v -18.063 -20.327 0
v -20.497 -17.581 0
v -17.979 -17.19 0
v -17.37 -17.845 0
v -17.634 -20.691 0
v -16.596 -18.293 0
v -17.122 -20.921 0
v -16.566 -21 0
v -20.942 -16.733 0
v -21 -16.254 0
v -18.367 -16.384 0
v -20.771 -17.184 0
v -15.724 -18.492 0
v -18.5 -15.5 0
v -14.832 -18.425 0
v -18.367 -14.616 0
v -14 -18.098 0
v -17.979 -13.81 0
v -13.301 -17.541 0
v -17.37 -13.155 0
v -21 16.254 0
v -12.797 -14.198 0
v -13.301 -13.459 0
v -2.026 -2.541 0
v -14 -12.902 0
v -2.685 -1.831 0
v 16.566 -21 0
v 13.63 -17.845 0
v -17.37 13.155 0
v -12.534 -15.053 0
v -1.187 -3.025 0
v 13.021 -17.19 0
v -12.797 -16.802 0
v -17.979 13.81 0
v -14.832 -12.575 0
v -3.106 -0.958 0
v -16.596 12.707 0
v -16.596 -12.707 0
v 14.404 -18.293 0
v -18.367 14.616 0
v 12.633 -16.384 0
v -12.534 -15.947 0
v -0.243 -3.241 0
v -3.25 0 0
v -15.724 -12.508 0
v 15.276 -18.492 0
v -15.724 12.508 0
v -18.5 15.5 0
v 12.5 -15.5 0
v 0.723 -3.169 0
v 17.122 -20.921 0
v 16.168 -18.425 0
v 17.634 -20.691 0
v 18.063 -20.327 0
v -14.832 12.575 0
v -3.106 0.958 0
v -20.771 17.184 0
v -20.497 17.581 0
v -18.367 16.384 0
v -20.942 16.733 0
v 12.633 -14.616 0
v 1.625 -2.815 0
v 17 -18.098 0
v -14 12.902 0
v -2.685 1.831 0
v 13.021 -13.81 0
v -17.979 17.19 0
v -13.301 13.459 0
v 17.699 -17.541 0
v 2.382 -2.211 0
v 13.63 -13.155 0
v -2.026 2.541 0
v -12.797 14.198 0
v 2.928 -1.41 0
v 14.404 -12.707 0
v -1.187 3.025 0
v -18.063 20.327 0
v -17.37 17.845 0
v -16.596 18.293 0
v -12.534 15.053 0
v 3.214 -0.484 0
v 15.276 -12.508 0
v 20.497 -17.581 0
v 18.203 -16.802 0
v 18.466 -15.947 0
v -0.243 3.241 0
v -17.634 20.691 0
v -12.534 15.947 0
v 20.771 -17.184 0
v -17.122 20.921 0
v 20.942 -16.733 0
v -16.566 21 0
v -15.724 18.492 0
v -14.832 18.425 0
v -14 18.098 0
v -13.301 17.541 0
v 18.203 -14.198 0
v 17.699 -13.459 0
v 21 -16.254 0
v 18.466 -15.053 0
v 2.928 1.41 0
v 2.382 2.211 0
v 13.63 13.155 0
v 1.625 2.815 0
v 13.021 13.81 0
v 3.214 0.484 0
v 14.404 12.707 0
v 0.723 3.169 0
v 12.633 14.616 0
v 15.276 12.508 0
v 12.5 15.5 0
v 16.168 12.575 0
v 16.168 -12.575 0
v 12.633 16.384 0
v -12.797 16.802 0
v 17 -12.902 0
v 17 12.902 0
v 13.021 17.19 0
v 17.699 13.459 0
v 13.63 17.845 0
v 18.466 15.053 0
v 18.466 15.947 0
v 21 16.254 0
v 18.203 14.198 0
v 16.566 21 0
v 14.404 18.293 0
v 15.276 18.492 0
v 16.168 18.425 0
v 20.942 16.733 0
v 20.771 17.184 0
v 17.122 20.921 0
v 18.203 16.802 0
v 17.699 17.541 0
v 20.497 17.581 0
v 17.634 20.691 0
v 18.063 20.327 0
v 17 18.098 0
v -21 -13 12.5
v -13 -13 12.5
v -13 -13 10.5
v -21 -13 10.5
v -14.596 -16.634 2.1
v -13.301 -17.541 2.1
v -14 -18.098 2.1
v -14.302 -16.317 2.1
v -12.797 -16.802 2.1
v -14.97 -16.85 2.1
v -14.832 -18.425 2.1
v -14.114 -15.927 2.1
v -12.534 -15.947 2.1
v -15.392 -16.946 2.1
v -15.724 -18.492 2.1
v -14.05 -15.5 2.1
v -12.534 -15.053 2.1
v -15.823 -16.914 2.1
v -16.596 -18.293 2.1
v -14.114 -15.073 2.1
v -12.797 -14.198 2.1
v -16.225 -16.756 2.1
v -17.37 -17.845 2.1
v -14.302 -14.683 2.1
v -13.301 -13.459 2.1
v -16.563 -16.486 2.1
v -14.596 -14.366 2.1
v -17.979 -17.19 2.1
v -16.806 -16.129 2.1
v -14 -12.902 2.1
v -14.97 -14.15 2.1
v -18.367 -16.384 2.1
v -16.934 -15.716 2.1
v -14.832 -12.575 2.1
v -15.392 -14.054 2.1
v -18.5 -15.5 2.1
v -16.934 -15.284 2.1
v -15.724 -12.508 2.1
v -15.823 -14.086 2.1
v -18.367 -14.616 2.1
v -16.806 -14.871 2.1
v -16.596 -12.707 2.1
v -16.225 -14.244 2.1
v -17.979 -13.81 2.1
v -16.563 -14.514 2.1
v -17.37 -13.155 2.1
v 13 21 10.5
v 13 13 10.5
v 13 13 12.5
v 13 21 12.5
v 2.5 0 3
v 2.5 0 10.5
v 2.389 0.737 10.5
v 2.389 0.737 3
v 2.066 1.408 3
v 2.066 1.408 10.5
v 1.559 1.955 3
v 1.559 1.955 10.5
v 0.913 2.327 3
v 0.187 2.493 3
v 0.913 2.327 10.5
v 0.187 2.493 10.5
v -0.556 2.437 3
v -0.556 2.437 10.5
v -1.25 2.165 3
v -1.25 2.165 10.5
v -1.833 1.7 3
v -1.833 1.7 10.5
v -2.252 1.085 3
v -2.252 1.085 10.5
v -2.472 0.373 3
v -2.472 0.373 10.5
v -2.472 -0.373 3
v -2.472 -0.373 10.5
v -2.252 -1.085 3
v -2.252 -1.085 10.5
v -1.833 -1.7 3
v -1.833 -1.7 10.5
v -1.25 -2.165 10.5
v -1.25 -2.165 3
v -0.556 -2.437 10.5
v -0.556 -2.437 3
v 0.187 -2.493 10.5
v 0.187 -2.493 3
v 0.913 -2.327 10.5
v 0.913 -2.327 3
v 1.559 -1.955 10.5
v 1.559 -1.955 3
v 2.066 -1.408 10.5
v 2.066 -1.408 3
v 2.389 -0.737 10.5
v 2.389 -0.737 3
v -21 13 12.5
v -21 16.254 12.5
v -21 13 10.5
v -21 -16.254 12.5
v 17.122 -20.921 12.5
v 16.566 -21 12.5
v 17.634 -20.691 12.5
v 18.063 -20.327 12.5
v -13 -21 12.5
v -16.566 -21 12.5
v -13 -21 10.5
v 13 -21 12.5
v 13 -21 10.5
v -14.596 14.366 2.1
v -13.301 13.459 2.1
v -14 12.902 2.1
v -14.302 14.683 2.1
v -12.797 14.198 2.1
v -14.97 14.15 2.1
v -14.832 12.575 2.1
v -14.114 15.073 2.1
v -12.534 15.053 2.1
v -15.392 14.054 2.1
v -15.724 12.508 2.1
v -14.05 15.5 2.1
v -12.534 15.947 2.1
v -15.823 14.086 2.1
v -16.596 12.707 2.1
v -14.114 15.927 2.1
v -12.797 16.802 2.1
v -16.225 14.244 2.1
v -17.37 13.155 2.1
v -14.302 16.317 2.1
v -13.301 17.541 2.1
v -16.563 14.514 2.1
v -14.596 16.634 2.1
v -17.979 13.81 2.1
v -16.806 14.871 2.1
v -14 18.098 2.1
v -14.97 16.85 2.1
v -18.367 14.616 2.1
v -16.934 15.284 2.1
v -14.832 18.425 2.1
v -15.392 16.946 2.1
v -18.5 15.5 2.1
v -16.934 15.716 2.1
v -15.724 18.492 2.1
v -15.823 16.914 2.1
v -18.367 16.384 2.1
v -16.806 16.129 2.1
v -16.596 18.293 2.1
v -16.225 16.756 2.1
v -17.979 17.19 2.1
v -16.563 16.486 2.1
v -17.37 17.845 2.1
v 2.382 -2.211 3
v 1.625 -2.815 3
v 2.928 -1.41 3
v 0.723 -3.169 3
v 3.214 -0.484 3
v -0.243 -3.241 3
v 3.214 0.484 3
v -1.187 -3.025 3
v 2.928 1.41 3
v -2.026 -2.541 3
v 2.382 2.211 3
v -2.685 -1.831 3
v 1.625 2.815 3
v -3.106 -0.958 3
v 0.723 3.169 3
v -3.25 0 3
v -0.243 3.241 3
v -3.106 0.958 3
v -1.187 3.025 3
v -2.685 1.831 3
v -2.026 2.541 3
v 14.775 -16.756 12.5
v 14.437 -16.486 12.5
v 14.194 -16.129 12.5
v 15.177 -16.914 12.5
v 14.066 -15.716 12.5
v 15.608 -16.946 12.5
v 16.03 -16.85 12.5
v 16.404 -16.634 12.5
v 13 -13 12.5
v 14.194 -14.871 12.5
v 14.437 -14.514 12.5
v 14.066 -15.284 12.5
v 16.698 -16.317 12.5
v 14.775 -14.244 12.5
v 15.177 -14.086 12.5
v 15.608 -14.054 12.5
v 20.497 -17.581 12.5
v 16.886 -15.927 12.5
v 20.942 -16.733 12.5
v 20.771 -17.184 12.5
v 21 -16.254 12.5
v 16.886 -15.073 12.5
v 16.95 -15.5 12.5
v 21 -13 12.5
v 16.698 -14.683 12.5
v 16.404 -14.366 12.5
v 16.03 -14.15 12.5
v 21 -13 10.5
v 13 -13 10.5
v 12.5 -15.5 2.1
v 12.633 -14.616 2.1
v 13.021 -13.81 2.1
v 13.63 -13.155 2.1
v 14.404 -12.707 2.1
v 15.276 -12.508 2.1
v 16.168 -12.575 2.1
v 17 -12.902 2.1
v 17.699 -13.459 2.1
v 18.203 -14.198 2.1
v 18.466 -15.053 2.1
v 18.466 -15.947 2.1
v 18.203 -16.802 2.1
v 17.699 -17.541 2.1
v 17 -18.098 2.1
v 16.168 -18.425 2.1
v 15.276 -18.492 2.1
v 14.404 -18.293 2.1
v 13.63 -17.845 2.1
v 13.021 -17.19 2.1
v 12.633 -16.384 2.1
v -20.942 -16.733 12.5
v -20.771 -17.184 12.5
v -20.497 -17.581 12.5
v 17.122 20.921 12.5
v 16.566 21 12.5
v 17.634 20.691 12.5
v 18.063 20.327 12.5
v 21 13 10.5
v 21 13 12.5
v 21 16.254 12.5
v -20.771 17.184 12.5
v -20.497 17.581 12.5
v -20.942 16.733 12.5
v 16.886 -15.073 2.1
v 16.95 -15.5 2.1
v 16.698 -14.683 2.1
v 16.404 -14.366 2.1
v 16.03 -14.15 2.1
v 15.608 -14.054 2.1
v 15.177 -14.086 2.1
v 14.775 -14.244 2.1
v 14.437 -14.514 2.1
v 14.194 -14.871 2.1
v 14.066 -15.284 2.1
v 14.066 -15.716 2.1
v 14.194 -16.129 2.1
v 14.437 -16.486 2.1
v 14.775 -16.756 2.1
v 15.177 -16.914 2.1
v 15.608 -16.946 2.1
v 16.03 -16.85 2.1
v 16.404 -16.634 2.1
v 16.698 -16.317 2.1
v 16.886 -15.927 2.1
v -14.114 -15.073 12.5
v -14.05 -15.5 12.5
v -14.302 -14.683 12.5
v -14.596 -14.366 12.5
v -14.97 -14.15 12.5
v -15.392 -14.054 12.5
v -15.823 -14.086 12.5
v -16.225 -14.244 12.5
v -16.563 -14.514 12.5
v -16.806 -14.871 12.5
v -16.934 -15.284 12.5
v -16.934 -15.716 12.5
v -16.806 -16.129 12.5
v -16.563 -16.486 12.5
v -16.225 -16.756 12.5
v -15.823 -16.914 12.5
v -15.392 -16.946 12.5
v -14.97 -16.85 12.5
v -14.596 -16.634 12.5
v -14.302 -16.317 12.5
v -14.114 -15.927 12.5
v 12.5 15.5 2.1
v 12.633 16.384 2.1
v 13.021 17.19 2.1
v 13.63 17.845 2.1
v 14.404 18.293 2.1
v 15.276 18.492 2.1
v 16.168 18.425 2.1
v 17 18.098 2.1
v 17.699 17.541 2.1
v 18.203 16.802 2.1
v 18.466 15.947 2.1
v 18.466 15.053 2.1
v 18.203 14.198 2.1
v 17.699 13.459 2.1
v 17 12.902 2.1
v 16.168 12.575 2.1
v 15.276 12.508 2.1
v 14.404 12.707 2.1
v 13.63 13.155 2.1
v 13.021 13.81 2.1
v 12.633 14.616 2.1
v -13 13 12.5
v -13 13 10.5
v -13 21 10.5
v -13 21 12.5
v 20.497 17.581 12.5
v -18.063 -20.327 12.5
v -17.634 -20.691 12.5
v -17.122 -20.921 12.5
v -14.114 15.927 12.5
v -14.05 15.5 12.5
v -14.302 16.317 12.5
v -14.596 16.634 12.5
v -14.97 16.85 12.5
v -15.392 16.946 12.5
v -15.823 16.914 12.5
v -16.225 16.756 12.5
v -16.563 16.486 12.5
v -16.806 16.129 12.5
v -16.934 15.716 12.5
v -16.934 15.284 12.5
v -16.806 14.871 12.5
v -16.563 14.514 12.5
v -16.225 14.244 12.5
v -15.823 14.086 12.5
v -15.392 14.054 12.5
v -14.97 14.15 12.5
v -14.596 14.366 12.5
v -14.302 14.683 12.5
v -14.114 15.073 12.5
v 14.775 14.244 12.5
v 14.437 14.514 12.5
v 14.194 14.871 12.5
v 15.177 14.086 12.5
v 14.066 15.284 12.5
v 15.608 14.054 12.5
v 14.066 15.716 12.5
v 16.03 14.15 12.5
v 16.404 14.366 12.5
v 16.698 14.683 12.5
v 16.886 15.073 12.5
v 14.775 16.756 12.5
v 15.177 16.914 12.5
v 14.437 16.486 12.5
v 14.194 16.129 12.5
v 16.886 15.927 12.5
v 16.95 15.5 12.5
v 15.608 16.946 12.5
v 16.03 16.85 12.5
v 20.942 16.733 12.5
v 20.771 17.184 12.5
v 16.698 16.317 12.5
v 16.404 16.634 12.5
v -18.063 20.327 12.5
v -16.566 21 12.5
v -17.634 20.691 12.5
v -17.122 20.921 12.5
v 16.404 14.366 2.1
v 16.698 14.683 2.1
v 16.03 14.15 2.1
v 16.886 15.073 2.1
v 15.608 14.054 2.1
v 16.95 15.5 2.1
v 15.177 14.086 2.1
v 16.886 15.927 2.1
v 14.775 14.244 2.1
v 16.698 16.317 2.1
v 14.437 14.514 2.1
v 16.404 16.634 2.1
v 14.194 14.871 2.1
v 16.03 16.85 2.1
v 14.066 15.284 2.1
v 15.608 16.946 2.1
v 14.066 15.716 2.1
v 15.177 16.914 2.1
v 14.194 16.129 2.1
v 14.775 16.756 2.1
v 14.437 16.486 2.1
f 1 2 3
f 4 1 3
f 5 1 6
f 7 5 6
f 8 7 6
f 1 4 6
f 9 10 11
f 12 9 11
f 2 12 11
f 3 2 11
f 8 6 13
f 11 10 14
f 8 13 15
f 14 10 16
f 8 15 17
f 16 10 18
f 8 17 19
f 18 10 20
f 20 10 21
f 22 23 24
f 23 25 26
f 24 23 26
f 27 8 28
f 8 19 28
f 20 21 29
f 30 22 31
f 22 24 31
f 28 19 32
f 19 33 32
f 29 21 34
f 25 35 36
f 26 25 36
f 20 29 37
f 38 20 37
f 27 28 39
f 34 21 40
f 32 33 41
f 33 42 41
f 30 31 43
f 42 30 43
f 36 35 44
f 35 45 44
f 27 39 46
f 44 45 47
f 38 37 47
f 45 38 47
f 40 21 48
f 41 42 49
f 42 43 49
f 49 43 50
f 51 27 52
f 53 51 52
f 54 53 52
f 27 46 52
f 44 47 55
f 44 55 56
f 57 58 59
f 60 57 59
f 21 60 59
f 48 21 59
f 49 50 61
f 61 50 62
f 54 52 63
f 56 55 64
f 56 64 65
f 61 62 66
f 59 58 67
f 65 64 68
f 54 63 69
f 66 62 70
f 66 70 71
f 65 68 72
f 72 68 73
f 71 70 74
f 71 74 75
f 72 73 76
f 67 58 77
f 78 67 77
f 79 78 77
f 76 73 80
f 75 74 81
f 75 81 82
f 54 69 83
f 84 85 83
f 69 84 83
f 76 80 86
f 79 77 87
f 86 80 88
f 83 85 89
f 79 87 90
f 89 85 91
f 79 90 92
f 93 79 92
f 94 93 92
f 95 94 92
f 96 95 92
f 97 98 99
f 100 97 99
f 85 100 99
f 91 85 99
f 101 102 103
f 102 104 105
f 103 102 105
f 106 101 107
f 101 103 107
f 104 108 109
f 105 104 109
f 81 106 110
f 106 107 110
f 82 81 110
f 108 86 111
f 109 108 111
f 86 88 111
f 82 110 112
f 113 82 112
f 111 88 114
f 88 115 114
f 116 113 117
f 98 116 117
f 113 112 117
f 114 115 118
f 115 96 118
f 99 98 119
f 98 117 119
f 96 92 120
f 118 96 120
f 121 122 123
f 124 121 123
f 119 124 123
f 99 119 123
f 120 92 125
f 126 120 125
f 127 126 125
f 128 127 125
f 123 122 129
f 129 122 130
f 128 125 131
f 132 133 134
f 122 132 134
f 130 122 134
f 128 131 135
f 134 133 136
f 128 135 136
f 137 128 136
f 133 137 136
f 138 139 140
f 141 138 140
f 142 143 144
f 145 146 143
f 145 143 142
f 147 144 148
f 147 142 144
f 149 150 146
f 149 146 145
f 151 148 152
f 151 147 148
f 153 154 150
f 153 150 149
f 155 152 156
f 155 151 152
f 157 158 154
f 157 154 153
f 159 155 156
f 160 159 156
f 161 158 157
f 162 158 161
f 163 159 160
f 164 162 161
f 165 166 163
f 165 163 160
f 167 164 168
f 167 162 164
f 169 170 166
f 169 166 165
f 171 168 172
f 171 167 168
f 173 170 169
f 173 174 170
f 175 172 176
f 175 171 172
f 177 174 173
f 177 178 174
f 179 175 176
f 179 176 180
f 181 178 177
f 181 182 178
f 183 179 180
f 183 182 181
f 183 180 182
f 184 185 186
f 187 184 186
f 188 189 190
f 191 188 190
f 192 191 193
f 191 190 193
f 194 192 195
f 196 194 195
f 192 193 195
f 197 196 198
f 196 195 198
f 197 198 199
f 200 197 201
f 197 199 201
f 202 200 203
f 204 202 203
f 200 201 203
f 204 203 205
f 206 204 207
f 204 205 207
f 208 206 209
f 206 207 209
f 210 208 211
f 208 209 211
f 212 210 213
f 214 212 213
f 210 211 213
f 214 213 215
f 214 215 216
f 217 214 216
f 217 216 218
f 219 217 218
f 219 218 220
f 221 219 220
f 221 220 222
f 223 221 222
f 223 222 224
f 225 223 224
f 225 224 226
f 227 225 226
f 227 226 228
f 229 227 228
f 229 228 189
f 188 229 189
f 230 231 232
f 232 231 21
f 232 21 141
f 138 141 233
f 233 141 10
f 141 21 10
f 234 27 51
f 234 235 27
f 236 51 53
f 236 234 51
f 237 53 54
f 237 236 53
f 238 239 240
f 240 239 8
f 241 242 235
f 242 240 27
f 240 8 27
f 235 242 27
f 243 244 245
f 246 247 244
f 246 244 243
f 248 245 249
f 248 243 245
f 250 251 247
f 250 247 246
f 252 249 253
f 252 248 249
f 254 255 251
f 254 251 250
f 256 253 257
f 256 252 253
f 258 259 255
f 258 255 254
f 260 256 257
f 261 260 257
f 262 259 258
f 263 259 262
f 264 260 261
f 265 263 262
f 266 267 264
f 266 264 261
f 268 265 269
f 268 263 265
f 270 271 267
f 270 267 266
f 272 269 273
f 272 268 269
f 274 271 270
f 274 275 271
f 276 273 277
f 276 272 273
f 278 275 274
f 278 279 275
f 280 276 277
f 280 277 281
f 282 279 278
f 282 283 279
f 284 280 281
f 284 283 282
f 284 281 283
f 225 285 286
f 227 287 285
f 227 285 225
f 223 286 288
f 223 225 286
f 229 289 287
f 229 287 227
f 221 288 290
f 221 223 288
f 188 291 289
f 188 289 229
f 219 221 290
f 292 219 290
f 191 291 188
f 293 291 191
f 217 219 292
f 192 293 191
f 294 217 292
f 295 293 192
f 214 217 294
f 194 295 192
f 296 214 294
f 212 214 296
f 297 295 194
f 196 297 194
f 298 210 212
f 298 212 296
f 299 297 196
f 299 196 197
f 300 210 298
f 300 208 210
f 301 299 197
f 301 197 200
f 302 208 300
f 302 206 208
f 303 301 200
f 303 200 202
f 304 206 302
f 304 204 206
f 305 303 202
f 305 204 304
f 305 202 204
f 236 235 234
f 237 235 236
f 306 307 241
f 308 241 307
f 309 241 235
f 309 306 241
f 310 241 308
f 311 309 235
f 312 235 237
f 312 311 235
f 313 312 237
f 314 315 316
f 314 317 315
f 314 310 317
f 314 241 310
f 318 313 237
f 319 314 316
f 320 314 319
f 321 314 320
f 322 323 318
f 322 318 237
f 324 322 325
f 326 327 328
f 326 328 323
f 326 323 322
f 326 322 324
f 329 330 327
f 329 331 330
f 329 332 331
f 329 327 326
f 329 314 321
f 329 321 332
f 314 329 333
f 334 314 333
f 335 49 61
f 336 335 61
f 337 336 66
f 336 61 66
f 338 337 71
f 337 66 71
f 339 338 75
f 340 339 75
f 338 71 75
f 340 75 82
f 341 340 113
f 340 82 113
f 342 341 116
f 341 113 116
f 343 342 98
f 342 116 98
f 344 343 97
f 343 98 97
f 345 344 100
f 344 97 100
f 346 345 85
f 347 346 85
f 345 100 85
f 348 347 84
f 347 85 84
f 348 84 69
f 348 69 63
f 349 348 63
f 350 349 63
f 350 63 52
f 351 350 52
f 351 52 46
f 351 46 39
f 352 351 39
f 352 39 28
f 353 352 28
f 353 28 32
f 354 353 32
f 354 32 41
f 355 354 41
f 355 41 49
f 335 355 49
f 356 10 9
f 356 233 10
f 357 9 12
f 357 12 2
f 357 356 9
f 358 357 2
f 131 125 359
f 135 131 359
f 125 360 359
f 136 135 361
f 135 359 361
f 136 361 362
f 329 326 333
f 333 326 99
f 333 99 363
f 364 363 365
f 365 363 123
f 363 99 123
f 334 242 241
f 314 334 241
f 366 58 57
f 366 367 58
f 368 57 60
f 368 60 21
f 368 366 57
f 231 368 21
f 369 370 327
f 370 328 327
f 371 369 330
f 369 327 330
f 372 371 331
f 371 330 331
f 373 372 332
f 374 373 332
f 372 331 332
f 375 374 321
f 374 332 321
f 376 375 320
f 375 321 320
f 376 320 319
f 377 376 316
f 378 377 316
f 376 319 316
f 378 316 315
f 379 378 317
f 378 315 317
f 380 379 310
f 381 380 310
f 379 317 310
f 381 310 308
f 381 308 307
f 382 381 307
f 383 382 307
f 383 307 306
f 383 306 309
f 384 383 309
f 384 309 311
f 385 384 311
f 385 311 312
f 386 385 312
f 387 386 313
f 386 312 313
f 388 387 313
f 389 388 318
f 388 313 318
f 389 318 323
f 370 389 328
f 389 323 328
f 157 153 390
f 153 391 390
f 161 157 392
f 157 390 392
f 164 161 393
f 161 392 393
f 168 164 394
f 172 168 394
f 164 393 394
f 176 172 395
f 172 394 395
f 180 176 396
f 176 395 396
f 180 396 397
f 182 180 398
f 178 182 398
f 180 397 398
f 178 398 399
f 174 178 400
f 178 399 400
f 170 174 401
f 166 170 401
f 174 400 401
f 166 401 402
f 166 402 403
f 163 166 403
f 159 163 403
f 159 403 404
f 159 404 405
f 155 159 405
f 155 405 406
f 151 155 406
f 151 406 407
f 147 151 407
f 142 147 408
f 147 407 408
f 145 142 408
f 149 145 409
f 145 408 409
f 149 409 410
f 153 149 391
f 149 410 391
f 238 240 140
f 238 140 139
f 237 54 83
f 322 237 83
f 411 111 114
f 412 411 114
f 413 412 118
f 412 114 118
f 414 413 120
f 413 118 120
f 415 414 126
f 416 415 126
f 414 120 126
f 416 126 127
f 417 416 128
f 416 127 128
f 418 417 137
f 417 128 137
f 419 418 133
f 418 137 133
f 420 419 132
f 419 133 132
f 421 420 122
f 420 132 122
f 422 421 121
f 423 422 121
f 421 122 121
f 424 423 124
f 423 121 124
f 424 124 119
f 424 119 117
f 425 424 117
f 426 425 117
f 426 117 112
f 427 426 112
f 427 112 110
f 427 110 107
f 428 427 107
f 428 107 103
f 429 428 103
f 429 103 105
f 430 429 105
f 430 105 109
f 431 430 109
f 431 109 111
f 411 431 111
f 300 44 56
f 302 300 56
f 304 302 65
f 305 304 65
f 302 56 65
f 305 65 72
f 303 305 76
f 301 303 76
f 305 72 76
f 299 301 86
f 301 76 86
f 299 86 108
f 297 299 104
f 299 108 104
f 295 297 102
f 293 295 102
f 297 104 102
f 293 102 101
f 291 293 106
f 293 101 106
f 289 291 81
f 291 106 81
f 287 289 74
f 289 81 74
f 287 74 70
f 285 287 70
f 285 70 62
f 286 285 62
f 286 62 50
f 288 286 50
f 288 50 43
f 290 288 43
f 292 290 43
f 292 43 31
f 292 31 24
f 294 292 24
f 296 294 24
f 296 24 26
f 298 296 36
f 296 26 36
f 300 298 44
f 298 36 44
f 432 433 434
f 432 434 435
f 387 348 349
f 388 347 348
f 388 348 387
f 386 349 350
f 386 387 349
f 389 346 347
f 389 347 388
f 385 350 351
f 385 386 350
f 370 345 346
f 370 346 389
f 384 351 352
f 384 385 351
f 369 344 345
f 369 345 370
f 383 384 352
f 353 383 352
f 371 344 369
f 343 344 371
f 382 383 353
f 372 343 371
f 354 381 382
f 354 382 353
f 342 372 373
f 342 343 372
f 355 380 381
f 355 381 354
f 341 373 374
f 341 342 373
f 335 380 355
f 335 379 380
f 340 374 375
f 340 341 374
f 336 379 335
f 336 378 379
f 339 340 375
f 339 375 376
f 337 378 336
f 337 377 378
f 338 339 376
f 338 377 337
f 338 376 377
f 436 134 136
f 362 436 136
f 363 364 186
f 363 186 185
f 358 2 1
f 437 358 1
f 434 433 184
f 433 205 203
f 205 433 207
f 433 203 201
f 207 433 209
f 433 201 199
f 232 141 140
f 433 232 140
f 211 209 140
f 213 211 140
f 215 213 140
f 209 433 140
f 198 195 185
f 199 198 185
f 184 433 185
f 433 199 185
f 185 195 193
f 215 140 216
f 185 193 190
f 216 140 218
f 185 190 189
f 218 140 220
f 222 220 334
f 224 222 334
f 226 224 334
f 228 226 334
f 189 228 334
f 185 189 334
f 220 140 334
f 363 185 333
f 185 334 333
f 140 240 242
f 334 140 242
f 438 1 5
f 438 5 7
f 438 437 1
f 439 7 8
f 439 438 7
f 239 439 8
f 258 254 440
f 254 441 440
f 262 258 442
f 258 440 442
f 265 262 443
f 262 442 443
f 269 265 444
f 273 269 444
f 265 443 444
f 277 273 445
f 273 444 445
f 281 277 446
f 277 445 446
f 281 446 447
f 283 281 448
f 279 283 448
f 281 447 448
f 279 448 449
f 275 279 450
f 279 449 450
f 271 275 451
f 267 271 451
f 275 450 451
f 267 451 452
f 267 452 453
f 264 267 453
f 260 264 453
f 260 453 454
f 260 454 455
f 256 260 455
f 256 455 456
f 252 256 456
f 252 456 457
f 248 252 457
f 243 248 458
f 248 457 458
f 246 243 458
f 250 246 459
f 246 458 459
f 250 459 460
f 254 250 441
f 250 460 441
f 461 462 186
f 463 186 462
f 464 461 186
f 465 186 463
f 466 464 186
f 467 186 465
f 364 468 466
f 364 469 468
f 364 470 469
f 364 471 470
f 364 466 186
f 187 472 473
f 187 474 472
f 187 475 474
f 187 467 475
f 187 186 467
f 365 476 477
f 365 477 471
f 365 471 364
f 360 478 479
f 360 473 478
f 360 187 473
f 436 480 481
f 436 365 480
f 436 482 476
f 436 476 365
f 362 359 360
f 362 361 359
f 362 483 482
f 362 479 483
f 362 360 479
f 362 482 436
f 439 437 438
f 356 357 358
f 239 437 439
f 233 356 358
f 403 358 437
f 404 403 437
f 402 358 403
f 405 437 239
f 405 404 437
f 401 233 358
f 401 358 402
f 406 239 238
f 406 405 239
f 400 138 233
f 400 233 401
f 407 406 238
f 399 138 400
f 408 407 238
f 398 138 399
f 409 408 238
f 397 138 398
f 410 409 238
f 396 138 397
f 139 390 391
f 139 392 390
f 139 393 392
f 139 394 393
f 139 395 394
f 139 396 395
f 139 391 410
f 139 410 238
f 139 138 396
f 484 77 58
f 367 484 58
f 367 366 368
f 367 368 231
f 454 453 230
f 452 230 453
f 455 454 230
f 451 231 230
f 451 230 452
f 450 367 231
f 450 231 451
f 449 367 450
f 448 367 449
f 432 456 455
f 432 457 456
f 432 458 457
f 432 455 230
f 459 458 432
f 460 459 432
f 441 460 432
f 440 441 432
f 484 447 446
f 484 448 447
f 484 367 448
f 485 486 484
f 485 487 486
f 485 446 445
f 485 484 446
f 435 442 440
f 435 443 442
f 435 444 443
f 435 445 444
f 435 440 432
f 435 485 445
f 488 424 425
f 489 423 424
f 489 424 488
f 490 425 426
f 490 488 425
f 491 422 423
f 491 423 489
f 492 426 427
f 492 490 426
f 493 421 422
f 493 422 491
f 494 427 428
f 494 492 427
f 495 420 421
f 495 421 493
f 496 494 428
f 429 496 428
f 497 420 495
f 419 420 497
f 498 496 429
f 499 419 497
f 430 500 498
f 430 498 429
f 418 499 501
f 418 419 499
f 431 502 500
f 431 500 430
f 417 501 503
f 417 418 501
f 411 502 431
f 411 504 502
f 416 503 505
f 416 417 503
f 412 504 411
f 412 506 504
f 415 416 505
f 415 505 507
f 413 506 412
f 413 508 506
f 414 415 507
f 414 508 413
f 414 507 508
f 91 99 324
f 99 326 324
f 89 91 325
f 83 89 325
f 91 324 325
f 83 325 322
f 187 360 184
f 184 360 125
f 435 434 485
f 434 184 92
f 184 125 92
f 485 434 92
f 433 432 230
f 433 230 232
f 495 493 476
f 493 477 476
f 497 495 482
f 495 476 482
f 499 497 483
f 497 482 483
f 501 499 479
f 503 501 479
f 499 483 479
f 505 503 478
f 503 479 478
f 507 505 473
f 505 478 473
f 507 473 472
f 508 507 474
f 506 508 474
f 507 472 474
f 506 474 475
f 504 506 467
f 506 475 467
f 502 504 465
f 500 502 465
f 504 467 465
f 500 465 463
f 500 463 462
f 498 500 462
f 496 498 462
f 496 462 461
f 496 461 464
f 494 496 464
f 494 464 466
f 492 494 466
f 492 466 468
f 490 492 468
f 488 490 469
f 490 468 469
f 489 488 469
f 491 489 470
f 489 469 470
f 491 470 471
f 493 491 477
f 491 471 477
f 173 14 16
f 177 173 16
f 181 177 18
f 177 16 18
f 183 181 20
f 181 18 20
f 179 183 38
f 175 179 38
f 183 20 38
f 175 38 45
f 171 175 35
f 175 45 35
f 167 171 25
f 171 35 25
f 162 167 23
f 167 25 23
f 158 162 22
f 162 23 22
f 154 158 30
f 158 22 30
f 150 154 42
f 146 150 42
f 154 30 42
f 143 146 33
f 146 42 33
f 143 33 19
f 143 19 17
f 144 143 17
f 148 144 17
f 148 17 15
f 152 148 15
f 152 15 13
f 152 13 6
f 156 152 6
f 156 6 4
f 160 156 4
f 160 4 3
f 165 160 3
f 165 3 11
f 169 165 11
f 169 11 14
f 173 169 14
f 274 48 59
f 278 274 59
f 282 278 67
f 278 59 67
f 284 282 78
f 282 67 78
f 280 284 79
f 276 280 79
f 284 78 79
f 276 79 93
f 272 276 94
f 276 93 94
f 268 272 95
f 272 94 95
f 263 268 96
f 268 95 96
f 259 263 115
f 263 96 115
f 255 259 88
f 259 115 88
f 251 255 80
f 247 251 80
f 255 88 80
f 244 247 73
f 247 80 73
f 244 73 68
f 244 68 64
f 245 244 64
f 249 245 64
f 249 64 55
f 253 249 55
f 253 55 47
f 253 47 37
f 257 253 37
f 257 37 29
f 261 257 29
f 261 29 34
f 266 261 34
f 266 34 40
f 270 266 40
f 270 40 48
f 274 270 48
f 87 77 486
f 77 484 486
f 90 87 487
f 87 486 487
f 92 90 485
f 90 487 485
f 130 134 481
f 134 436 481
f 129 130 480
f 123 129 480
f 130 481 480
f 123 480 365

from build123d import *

# Parameters (mm, degrees)
BOSS_EXTRUDE1_DEPTH                                = 12.5
SKETCH2_W                                          = 2
SKETCH2_H                                          = 26
CUT_EXTRUDE1_DEPTH                                 = 43
SKETCH3_W                                          = 26
SKETCH3_H                                          = 2
CUT_EXTRUDE2_DEPTH                                 = 43
SKETCH4_R                                          = 3.25
CUT_EXTRUDE3_DEPTH                                 = 3
SKETCH5_R                                          = 2.5
CUT_EXTRUDE4_DEPTH                                 = 11.5
CBORE_FOR_M2_5_PAN_HEAD_MACHINE_SCREW1_D           = 2.9
CBORE_FOR_M2_5_PAN_HEAD_MACHINE_SCREW1_CBORE_D     = 6
CBORE_FOR_M2_5_PAN_HEAD_MACHINE_SCREW1_CBORE_DEPTH = 2.1
FILLET1_R                                          = 2


with BuildPart() as part:
    # Sketch1 → Boss-Extrude1 (new body)
    with BuildSketch(Plane.XY):
        Polygon((-17.465670258, 21), (-21, 17.012864847), (-21, -17.012864847), (-17.465670258, -21), (17.465670258, -21), (21, -17.012864847), (21, 17.012864847), (17.465670258, 21), align=None)
    extrude(amount=BOSS_EXTRUDE1_DEPTH)

    # Sketch2 → Cut-Extrude1 (cut, through all)
    with BuildSketch(Plane(origin=(21, 0, 0), x_dir=(0, 0, -1), z_dir=(1, 0, 0))):
        with Locations((-11.5, 0)):
            Rectangle(SKETCH2_W, SKETCH2_H)
    extrude(amount=-CUT_EXTRUDE1_DEPTH, mode=Mode.SUBTRACT)

    # Sketch3 → Cut-Extrude2 (cut, through all)
    with BuildSketch(Plane.XZ.offset(21)):
        with Locations((0, 11.5)):
            Rectangle(SKETCH3_W, SKETCH3_H)
    extrude(amount=-CUT_EXTRUDE2_DEPTH, mode=Mode.SUBTRACT)

    # Sketch4 → Cut-Extrude3 (cut)
    with BuildSketch(Plane(origin=(0, 0, 0), x_dir=(-1, 0, 0), z_dir=(0, 0, -1))):
        Circle(SKETCH4_R)
    extrude(amount=-CUT_EXTRUDE3_DEPTH, mode=Mode.SUBTRACT)

    # Sketch5 → Cut-Extrude4 (cut, through all)
    with BuildSketch(Plane.XY.offset(10.5)):
        Circle(SKETCH5_R)
    extrude(amount=-CUT_EXTRUDE4_DEPTH, mode=Mode.SUBTRACT)

    # CBORE for M2.5 Pan Head Machine Screw1 (through all)
    with Locations(Plane(origin=(0, 0, 0), x_dir=(-1, 0, 0), z_dir=(0, 0, -1))):
        with Locations((-15.5, 15.5), (15.5, 15.5), (15.5, -15.5), (-15.5, -15.5)):
            CounterBoreHole(CBORE_FOR_M2_5_PAN_HEAD_MACHINE_SCREW1_D / 2, CBORE_FOR_M2_5_PAN_HEAD_MACHINE_SCREW1_CBORE_D / 2, CBORE_FOR_M2_5_PAN_HEAD_MACHINE_SCREW1_CBORE_DEPTH)

    # Fillet1
    fillet1_edges = [part.edges().sort_by_distance(p)[0] for p in [
        (17.465670258, 21, 6.25),
        (21, 17.012864847, 6.25),
        (21, -17.012864847, 6.25),
        (17.465670258, -21, 6.25),
        (-17.465670258, -21, 6.25),
        (-21, -17.012864847, 6.25),
        (-21, 17.012864847, 6.25),
        (-17.465670258, 21, 6.25),
    ]]
    fillet(fillet1_edges, radius=FILLET1_R)


solid = part.part
